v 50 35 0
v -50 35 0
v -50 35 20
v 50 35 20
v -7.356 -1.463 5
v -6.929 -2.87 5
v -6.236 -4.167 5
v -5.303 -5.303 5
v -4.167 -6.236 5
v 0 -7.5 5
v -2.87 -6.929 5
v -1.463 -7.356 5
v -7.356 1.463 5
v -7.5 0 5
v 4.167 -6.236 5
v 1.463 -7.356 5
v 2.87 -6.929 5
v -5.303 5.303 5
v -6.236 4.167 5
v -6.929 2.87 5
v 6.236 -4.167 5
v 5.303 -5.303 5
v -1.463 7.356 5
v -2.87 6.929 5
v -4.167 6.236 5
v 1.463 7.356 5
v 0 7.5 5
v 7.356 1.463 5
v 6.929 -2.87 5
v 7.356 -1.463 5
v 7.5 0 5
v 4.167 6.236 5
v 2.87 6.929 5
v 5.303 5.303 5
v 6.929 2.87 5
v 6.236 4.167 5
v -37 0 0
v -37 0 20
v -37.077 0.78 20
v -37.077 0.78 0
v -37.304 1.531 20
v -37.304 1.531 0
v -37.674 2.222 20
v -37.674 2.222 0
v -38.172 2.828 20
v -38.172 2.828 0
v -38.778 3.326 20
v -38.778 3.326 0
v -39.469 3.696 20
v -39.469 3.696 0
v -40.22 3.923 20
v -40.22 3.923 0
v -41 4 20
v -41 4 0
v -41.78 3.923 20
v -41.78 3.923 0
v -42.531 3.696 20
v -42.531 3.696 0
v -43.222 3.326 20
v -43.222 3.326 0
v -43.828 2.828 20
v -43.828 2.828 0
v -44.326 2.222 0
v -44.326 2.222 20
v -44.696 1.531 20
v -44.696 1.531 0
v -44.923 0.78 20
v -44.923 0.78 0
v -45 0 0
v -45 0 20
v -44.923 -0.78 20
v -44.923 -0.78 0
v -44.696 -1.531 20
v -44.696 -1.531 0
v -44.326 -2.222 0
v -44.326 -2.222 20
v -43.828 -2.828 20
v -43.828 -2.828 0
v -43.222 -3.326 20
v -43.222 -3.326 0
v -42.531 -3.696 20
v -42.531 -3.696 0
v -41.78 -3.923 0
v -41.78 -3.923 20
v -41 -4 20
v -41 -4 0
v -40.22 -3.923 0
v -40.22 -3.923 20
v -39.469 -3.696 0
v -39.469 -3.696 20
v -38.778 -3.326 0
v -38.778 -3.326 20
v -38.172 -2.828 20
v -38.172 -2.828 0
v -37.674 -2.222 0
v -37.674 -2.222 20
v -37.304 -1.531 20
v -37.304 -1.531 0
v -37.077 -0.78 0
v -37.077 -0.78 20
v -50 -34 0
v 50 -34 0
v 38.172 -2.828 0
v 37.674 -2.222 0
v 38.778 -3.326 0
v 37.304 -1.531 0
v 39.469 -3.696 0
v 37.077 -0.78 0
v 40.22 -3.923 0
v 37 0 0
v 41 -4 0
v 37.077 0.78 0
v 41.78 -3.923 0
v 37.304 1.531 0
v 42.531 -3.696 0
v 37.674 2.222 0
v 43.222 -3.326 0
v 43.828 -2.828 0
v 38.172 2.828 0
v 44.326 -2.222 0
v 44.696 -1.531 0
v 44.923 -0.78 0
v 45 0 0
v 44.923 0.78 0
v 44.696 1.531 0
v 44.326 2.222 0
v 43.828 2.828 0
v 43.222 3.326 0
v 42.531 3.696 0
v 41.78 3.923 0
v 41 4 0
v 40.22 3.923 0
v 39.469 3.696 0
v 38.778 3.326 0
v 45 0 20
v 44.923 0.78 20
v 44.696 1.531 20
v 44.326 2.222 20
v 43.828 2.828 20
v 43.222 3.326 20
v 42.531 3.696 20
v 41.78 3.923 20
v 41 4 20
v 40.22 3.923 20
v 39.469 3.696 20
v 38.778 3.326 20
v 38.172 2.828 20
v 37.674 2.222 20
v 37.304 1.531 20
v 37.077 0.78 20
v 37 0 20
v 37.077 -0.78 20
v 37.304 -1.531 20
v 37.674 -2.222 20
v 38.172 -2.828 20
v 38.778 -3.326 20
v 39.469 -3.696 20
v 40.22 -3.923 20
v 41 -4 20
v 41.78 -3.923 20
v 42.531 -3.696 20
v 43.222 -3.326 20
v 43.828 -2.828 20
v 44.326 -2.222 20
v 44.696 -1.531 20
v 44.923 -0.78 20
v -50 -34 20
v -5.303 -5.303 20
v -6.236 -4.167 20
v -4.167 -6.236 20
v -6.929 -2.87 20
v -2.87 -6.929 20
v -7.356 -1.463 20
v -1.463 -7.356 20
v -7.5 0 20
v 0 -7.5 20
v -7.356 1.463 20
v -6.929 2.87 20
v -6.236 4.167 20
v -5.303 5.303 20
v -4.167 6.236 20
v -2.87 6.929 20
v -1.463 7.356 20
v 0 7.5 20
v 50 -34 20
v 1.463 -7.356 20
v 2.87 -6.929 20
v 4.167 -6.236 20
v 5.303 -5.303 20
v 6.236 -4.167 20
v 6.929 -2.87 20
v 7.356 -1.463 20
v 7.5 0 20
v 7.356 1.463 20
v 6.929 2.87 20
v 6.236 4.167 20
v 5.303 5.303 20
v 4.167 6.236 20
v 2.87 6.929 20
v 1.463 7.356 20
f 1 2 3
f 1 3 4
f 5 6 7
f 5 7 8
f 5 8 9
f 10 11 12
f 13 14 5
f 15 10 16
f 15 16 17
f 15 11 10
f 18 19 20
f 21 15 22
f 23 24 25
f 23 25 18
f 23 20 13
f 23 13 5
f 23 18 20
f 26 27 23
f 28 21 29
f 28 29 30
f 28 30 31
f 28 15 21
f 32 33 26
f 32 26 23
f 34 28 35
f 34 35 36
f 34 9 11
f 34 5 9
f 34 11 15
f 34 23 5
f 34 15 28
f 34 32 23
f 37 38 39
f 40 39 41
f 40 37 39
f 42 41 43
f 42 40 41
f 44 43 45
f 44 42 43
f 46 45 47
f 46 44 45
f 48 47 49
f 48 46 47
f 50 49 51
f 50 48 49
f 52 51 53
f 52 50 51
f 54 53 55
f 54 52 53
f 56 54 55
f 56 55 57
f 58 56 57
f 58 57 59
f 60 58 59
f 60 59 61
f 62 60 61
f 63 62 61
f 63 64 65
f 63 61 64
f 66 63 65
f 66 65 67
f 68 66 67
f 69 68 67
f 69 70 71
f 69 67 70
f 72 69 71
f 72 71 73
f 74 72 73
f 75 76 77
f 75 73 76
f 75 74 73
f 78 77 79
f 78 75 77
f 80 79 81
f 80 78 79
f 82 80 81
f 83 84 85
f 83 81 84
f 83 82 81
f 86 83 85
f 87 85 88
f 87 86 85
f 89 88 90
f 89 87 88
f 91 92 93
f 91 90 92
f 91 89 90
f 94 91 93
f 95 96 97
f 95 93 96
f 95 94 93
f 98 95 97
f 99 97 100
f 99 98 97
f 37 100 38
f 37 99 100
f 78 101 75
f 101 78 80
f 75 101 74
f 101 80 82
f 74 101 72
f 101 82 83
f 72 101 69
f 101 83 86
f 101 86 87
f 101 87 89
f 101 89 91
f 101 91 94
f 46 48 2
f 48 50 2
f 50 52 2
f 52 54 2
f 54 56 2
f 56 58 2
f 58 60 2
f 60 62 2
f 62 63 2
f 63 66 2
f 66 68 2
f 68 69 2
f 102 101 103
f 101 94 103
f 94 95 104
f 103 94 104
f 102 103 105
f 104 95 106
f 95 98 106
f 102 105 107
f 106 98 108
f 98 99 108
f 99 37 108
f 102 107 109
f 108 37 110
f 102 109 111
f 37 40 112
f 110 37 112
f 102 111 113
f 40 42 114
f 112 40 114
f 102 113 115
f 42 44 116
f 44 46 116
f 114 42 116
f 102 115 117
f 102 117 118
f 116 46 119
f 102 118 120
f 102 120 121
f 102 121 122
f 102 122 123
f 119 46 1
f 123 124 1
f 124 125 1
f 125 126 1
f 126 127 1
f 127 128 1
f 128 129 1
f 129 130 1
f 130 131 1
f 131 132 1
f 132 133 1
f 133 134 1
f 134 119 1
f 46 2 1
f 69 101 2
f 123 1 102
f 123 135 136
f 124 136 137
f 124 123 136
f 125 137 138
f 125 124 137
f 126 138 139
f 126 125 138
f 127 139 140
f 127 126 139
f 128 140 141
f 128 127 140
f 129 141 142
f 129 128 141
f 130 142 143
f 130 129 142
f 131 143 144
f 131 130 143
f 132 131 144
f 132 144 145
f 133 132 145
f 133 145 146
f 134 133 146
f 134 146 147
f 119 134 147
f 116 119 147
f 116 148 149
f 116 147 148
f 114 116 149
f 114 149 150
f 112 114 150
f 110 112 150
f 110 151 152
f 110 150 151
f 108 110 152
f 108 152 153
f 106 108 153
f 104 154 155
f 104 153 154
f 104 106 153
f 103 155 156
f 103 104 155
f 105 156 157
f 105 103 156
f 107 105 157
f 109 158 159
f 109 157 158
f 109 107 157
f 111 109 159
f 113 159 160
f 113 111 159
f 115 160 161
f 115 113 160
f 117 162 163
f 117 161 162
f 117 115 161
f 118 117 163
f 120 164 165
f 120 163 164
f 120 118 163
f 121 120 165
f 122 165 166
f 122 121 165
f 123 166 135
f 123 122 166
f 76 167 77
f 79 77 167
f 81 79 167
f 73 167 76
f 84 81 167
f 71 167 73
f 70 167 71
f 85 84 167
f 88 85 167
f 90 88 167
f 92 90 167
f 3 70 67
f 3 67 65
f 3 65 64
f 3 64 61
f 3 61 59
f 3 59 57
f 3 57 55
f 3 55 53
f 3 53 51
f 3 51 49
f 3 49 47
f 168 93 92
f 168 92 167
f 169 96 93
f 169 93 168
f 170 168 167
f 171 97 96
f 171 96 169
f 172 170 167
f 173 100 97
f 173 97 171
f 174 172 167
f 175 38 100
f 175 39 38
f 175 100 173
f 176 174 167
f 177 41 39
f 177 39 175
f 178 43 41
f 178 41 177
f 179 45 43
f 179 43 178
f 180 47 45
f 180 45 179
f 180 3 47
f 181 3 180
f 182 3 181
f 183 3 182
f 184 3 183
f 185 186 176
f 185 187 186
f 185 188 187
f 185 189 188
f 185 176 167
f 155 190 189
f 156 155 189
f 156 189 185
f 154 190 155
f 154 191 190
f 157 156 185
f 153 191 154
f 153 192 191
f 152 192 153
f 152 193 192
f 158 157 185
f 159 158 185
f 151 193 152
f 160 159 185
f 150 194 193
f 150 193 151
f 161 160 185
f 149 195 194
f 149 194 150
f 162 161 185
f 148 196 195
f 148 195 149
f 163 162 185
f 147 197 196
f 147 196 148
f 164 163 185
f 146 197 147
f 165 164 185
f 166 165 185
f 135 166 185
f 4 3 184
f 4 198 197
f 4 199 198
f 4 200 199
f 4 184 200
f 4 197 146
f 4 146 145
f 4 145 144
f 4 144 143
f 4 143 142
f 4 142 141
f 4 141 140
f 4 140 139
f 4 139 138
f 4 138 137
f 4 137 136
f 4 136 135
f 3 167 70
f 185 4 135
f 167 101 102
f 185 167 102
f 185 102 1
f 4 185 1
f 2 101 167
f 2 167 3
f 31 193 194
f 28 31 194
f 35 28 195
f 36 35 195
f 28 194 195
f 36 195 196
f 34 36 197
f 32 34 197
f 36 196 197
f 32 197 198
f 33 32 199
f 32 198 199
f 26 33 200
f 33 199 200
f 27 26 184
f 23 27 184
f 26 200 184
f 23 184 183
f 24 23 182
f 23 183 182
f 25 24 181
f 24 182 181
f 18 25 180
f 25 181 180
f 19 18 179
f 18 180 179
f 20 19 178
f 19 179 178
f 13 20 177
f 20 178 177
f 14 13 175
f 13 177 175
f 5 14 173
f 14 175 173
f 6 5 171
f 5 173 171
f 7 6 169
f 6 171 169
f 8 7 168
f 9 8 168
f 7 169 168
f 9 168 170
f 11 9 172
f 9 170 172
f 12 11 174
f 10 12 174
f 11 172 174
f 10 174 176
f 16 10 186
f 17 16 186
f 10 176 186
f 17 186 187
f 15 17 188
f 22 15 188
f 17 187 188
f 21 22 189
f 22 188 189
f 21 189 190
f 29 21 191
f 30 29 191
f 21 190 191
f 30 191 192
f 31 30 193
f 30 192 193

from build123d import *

# Parameters (mm, degrees)
SKETCH1_W               = 100
SKETCH1_H               = 70
BOSS_EXTRUDE1_DEPTH     = 20
SKETCH2_R               = 4
CUT_EXTRUDE1_DEPTH      = 21
CUT_EXTRUDE1_DEPTH_BACK = 1
SKETCH3_R               = 7.5
CUT_EXTRUDE2_DEPTH      = 15
SKETCH4_W               = 100
SKETCH4_H               = 1
CUT_EXTRUDE3_DEPTH      = 21
CUT_EXTRUDE3_DEPTH_BACK = 1


with BuildPart() as part:
    # Sketch1 → Boss-Extrude1 (new body)
    with BuildSketch(Plane.XY):
        Rectangle(SKETCH1_W, SKETCH1_H)
    extrude(amount=BOSS_EXTRUDE1_DEPTH)

    # Sketch2 → Cut-Extrude1 (cut, two sides)
    with BuildSketch(Plane.XY) as cut_extrude1_sk:
        with Locations((-41, 0)):
            Circle(SKETCH2_R)
        with Locations((41, 0)):
            Circle(SKETCH2_R)
    extrude(amount=CUT_EXTRUDE1_DEPTH, mode=Mode.SUBTRACT)
    extrude(cut_extrude1_sk.sketch, amount=-CUT_EXTRUDE1_DEPTH_BACK, mode=Mode.SUBTRACT)

    # Sketch3 → Cut-Extrude2 (cut)
    with BuildSketch(Plane.XY.offset(20)):
        Circle(SKETCH3_R)
    extrude(amount=-CUT_EXTRUDE2_DEPTH, mode=Mode.SUBTRACT)

    # Sketch4 → Cut-Extrude3 (cut, two sides)
    with BuildSketch(Plane.XY) as cut_extrude3_sk:
        with Locations((0, -34.5)):
            Rectangle(SKETCH4_W, SKETCH4_H)
    extrude(amount=CUT_EXTRUDE3_DEPTH, mode=Mode.SUBTRACT)
    extrude(cut_extrude3_sk.sketch, amount=-CUT_EXTRUDE3_DEPTH_BACK, mode=Mode.SUBTRACT)


solid = part.part
